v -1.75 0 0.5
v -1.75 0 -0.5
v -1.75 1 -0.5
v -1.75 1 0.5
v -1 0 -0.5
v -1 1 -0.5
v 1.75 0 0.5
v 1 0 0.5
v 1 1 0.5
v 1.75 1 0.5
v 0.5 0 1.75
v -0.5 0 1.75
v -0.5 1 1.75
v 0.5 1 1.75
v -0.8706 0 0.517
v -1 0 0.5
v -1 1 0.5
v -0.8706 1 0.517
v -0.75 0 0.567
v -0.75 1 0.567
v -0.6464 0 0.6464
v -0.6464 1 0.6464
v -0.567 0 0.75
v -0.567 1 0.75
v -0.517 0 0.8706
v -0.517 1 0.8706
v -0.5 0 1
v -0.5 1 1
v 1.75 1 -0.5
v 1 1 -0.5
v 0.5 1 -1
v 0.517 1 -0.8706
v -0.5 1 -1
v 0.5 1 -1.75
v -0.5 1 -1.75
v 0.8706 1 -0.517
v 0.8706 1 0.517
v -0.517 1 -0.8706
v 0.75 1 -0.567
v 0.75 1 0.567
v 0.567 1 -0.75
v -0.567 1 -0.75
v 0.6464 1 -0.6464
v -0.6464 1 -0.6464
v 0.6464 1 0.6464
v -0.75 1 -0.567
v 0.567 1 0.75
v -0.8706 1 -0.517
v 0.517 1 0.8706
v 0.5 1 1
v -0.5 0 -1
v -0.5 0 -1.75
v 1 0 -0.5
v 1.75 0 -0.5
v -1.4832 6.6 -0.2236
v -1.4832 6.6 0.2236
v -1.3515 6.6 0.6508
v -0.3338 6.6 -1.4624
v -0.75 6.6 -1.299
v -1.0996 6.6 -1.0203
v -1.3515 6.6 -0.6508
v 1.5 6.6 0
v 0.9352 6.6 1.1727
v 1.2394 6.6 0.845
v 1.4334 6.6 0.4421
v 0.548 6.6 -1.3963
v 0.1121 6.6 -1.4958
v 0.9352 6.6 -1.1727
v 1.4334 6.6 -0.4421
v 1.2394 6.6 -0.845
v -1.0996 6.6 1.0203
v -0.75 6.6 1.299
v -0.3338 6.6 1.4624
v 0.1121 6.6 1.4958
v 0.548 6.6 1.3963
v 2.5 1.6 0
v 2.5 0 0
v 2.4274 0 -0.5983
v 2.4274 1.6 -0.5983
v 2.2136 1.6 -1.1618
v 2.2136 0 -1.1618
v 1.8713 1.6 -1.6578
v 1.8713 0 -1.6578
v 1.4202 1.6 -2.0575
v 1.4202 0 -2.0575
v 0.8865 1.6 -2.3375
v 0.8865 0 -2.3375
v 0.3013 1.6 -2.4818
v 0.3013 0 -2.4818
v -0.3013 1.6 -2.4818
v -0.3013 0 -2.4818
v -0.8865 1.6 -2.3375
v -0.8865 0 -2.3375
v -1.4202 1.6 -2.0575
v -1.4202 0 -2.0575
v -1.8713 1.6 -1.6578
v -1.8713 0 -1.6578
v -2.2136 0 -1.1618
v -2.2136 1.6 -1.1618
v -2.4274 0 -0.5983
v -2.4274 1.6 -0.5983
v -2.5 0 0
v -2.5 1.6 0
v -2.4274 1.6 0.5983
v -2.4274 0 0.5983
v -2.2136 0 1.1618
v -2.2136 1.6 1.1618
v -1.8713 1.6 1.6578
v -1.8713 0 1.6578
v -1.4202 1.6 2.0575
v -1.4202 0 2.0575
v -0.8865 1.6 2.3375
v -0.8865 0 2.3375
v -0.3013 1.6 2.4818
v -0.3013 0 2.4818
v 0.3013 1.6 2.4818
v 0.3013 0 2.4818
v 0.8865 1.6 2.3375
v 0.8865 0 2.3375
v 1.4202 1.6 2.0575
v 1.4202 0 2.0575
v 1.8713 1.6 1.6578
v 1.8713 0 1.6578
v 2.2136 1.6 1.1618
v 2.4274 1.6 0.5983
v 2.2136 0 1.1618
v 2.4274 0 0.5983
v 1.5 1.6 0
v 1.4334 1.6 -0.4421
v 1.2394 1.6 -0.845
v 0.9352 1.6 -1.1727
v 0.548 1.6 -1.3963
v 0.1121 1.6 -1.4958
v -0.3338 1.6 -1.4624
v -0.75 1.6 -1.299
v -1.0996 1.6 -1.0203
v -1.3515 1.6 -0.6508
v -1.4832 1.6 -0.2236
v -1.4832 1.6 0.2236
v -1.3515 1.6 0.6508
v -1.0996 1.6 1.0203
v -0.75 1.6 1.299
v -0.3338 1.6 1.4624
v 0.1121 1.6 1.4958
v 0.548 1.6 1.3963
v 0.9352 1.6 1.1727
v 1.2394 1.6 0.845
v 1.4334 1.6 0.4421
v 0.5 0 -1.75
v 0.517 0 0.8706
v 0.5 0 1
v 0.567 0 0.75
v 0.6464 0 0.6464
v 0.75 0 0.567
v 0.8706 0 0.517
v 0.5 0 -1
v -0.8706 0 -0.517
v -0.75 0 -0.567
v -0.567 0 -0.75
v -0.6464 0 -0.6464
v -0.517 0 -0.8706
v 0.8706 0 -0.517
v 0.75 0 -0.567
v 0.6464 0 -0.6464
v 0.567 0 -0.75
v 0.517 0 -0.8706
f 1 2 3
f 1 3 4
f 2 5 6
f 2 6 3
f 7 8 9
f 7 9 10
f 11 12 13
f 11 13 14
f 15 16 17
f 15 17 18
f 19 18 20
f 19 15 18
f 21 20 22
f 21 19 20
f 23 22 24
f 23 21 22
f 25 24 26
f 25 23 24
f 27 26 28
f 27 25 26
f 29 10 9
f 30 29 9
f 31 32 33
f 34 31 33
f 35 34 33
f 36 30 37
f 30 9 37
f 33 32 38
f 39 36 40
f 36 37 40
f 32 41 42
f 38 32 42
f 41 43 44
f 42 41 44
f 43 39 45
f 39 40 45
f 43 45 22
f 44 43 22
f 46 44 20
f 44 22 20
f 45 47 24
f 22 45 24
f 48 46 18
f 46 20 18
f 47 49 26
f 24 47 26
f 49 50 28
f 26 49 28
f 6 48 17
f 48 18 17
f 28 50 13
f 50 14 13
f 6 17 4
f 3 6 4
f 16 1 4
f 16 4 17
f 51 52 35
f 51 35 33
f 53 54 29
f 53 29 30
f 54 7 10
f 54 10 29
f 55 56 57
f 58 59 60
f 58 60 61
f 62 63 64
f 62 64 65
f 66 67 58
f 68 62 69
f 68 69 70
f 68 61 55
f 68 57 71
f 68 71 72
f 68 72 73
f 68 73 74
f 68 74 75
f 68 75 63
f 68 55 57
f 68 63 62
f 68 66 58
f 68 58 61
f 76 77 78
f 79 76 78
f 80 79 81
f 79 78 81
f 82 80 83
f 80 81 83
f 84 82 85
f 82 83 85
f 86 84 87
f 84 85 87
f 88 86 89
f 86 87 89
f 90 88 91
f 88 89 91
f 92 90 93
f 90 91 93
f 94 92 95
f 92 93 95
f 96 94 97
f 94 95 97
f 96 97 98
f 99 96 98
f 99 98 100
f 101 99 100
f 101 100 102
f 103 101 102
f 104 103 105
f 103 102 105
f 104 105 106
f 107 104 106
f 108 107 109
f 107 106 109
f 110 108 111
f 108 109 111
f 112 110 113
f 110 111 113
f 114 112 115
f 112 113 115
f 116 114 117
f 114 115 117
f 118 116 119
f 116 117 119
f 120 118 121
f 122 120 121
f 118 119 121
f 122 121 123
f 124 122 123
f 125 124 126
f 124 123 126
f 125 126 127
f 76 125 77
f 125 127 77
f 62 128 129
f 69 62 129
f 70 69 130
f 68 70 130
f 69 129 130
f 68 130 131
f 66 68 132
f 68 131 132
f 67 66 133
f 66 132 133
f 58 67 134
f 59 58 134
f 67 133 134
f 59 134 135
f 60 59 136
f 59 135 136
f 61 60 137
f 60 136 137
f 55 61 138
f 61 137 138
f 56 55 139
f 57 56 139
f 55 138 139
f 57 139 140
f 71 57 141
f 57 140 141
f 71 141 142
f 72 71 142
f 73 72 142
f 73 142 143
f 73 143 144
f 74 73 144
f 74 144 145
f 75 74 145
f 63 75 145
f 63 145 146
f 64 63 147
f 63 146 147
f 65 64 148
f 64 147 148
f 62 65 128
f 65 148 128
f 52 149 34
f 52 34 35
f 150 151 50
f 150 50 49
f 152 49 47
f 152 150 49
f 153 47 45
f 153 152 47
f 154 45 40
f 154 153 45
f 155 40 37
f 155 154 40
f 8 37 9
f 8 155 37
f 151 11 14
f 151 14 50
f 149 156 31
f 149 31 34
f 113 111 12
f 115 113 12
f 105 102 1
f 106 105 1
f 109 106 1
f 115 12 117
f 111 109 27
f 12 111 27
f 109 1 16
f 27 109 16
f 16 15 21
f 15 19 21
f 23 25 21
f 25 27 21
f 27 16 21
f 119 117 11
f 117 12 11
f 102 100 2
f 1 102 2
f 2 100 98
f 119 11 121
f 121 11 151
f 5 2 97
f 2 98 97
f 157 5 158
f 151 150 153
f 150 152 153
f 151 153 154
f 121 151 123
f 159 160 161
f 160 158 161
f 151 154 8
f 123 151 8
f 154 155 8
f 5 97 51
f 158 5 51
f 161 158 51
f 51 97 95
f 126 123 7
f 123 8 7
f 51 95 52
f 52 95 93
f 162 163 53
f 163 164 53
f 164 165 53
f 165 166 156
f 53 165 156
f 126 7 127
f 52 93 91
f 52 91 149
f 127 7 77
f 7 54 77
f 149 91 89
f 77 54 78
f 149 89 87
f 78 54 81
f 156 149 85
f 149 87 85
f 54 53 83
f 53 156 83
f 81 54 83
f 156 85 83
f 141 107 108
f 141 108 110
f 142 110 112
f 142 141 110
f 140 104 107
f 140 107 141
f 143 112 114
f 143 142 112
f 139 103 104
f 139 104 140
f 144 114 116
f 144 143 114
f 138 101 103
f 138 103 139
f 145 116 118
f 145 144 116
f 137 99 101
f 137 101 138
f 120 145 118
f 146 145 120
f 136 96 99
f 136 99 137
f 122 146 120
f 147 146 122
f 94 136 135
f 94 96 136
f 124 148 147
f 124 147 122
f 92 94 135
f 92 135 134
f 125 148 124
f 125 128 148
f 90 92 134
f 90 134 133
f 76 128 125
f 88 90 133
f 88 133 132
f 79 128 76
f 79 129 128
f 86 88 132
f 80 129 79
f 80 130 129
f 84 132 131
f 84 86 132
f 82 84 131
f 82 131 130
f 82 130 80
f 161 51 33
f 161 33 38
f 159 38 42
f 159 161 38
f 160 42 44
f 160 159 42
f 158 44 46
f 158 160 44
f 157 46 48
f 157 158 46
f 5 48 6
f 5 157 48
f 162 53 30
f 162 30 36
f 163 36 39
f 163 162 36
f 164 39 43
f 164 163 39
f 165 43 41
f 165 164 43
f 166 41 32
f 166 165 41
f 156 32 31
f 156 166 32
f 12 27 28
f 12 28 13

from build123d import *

# Parameters (mm, degrees)
SKETCH_1_R          = 2.5
EXTRUDE_1_DEPTH     = 1.6
SKETCH_2_R          = 1.5
EXTRUDE_2_DEPTH     = 5
CUT_EXTRUDE_1_DEPTH = 1


with BuildPart() as part:
    # 草图1 → 凸台-拉伸1 (new body)
    with BuildSketch(Plane(origin=(0, 0, 0), x_dir=(1, 0, 0), z_dir=(0, 1, 0))):
        Circle(SKETCH_1_R)
    extrude(amount=EXTRUDE_1_DEPTH)

    # 草图2 → 凸台-拉伸2 (add)
    with BuildSketch(Plane(origin=(0, 1.6, 0), x_dir=(1, 0, 0), z_dir=(0, 1, 0))):
        Circle(SKETCH_2_R)
    extrude(amount=EXTRUDE_2_DEPTH)

    # 草图3 → 切除-拉伸1 (cut)
    with BuildSketch(Plane.XZ):
        with BuildLine():
            Line((-0.5, 1), (-0.5, 1.75))
            Line((-0.5, 1.75), (0.5, 1.75))
            Line((0.5, 1.75), (0.5, 1))
            ThreePointArc((0.5, 1), (0.646446609, 0.646446609), (1, 0.5))
            Line((1, 0.5), (1.75, 0.5))
            Line((1.75, 0.5), (1.75, -0.5))
            Line((1.75, -0.5), (1, -0.5))
            ThreePointArc((1, -0.5), (0.646446609, -0.646446609), (0.5, -1))
            Line((0.5, -1), (0.5, -1.75))
            Line((0.5, -1.75), (-0.5, -1.75))
            Line((-0.5, -1.75), (-0.5, -1))
            ThreePointArc((-0.5, -1), (-0.646446609, -0.646446609), (-1, -0.5))
            Line((-1, -0.5), (-1.75, -0.5))
            Line((-1.75, -0.5), (-1.75, 0.5))
            Line((-1.75, 0.5), (-1, 0.5))
            ThreePointArc((-1, 0.5), (-0.646446609, 0.646446609), (-0.5, 1))
        make_face()
    extrude(amount=-CUT_EXTRUDE_1_DEPTH, mode=Mode.SUBTRACT)


solid = part.part
